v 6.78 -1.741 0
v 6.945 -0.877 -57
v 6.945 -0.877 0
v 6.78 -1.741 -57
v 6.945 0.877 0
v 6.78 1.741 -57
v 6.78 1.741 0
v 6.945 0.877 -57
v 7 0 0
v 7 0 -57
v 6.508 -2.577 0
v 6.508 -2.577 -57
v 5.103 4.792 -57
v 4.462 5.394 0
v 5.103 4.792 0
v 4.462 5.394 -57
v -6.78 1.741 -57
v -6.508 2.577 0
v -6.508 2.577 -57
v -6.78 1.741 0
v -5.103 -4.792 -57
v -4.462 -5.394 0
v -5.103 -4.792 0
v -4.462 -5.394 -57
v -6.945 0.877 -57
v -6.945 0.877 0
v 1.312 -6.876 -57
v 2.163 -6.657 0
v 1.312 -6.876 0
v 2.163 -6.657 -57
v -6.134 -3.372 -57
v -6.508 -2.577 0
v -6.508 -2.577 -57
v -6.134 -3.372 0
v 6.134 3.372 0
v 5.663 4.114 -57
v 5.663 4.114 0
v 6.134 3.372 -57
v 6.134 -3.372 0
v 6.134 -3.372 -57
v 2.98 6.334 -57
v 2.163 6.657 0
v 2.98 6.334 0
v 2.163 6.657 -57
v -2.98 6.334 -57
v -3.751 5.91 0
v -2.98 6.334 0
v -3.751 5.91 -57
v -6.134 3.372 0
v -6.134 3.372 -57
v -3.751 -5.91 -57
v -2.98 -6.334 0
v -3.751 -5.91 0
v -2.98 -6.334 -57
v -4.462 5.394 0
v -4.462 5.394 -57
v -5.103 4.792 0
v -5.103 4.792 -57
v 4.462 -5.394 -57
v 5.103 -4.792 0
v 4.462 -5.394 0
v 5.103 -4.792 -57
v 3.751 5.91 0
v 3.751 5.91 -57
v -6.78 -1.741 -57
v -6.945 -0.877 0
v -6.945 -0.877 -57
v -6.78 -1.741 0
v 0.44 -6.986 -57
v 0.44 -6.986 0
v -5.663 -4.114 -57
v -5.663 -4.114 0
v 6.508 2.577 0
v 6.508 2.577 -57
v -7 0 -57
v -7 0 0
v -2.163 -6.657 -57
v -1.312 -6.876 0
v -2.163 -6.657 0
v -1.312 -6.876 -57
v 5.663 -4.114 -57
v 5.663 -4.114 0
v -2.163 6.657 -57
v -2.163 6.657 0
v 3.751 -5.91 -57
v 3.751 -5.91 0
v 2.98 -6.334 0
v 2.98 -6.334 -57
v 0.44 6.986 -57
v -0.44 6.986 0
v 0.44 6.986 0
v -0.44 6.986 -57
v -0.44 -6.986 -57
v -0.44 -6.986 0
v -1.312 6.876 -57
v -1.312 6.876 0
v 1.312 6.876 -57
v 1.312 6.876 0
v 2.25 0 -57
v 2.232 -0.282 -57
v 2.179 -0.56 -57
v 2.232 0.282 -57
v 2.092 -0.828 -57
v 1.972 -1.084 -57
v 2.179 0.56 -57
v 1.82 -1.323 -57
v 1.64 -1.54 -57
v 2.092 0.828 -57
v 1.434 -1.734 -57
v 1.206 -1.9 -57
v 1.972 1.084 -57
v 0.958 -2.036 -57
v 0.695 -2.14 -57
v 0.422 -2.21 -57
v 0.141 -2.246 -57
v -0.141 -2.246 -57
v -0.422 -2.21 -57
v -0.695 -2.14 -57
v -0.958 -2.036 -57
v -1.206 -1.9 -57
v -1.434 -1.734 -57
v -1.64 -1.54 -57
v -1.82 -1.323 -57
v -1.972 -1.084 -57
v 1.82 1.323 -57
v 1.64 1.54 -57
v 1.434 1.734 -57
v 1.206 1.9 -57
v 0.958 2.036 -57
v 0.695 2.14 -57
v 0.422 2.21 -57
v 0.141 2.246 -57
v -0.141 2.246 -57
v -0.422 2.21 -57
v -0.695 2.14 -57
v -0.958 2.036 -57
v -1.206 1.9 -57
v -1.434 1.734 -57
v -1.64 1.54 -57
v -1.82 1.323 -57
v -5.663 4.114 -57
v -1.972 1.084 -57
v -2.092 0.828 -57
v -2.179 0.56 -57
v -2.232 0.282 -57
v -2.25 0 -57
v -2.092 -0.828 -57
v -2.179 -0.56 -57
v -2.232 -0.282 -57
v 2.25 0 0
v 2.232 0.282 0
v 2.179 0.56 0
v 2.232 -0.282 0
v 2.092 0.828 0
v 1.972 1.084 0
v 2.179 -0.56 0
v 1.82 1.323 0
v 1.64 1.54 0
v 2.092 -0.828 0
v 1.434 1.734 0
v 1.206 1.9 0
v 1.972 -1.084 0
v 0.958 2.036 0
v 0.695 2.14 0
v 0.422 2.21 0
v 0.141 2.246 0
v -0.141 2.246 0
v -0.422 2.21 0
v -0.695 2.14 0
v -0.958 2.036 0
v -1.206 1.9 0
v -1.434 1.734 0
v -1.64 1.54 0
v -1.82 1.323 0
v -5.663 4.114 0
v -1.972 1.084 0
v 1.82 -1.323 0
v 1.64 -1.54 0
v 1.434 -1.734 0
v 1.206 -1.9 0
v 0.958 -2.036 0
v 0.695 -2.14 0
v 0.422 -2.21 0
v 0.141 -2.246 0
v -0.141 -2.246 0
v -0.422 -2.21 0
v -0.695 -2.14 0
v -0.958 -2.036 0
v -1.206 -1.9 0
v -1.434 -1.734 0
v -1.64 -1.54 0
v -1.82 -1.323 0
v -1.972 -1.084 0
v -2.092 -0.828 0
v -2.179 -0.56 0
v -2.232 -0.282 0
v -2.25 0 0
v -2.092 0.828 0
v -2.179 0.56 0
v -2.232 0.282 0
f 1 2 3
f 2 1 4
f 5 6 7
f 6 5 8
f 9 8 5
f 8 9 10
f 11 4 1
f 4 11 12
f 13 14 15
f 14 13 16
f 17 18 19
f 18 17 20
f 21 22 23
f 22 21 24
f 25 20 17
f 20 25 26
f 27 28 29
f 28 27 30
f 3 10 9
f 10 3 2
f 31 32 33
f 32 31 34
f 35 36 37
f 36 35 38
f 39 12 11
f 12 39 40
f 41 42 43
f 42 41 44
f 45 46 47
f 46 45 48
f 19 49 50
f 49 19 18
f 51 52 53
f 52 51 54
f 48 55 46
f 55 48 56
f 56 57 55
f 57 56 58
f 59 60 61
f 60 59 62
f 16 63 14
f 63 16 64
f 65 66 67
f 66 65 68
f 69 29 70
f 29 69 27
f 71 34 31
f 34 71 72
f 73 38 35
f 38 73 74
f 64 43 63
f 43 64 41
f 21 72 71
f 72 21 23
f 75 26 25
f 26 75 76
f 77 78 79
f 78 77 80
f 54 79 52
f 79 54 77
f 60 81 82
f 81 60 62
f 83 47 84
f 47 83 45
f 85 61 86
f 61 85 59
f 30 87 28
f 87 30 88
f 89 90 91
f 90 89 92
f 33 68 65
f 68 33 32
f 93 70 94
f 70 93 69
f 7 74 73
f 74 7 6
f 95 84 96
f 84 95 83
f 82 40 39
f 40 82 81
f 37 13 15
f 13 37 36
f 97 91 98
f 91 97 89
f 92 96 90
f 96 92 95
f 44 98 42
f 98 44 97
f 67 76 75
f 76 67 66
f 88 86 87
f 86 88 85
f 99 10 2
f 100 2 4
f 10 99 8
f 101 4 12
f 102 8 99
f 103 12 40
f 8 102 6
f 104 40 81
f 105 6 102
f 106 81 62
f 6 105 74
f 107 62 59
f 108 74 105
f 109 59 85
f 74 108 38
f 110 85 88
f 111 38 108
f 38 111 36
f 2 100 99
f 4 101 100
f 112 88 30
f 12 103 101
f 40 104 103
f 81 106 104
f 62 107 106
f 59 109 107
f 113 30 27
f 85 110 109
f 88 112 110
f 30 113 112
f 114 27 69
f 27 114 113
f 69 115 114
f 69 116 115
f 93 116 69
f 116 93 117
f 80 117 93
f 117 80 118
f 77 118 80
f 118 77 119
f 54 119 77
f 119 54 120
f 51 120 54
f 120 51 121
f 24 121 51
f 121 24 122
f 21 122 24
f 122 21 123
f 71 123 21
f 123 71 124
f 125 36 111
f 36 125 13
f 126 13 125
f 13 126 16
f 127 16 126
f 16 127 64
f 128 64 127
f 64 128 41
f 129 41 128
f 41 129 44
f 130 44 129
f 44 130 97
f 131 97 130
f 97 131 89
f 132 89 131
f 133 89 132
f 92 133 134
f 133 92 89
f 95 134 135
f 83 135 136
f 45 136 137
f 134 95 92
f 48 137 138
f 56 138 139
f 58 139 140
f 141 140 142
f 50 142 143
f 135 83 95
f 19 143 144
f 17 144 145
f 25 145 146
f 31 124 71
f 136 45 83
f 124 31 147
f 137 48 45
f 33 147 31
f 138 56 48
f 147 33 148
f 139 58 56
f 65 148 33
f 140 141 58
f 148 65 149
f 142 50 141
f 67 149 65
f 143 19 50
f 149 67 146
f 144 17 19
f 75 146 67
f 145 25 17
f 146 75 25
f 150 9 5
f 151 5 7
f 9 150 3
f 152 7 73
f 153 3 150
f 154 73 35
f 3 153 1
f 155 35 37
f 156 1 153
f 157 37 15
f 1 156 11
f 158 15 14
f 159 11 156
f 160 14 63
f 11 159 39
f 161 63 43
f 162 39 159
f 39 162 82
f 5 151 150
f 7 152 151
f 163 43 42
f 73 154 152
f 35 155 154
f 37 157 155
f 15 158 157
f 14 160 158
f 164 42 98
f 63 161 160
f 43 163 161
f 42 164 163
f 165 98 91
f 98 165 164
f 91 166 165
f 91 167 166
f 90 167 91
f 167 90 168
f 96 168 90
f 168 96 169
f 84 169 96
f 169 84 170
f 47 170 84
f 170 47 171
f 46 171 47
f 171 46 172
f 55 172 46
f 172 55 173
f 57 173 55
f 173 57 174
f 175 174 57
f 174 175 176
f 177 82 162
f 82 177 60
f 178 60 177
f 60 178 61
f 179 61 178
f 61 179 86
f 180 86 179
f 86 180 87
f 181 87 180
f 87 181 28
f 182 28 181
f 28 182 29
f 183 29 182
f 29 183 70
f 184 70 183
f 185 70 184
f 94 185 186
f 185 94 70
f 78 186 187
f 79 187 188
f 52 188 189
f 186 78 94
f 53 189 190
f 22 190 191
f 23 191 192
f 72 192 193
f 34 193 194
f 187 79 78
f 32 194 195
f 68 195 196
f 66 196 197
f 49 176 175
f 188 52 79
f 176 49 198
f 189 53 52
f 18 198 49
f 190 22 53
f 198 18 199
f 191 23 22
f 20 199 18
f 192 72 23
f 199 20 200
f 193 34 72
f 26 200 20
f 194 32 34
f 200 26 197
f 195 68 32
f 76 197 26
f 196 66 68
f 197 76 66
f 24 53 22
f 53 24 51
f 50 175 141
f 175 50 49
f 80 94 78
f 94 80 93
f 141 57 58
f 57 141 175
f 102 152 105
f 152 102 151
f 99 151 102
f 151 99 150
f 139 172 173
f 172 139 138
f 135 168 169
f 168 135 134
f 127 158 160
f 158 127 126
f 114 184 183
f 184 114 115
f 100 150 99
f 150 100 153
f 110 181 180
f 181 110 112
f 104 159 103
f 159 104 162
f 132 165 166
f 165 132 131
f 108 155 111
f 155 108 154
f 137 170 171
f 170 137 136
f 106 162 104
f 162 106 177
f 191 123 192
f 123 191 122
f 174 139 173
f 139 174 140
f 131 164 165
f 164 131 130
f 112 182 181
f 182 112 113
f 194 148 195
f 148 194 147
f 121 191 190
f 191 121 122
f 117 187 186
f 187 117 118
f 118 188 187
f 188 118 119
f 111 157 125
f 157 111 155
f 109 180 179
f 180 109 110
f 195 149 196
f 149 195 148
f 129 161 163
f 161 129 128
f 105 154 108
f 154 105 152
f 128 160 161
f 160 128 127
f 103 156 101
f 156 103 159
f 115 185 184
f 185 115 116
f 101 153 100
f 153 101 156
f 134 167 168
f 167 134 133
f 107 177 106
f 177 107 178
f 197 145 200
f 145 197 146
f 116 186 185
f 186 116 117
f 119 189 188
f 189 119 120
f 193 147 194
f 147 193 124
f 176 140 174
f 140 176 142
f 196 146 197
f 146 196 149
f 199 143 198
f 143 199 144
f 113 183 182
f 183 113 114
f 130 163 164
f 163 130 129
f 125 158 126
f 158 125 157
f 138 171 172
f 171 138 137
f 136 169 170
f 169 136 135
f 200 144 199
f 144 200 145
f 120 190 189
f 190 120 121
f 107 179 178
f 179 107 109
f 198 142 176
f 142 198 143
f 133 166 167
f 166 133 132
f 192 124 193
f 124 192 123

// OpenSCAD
$fn = 50;


difference() {
	union() {
		translate(v = [0, 0, -57.0000000000]) {
			cylinder(h = 57, r = 7.0000000000);
		}
		cylinder(h = 0, r = 17.0000000000);
	}
	union() {
		#translate(v = [0, 0, -57]) {
			cylinder(h = 57, r = 2.2500000000);
		}
	}
}
